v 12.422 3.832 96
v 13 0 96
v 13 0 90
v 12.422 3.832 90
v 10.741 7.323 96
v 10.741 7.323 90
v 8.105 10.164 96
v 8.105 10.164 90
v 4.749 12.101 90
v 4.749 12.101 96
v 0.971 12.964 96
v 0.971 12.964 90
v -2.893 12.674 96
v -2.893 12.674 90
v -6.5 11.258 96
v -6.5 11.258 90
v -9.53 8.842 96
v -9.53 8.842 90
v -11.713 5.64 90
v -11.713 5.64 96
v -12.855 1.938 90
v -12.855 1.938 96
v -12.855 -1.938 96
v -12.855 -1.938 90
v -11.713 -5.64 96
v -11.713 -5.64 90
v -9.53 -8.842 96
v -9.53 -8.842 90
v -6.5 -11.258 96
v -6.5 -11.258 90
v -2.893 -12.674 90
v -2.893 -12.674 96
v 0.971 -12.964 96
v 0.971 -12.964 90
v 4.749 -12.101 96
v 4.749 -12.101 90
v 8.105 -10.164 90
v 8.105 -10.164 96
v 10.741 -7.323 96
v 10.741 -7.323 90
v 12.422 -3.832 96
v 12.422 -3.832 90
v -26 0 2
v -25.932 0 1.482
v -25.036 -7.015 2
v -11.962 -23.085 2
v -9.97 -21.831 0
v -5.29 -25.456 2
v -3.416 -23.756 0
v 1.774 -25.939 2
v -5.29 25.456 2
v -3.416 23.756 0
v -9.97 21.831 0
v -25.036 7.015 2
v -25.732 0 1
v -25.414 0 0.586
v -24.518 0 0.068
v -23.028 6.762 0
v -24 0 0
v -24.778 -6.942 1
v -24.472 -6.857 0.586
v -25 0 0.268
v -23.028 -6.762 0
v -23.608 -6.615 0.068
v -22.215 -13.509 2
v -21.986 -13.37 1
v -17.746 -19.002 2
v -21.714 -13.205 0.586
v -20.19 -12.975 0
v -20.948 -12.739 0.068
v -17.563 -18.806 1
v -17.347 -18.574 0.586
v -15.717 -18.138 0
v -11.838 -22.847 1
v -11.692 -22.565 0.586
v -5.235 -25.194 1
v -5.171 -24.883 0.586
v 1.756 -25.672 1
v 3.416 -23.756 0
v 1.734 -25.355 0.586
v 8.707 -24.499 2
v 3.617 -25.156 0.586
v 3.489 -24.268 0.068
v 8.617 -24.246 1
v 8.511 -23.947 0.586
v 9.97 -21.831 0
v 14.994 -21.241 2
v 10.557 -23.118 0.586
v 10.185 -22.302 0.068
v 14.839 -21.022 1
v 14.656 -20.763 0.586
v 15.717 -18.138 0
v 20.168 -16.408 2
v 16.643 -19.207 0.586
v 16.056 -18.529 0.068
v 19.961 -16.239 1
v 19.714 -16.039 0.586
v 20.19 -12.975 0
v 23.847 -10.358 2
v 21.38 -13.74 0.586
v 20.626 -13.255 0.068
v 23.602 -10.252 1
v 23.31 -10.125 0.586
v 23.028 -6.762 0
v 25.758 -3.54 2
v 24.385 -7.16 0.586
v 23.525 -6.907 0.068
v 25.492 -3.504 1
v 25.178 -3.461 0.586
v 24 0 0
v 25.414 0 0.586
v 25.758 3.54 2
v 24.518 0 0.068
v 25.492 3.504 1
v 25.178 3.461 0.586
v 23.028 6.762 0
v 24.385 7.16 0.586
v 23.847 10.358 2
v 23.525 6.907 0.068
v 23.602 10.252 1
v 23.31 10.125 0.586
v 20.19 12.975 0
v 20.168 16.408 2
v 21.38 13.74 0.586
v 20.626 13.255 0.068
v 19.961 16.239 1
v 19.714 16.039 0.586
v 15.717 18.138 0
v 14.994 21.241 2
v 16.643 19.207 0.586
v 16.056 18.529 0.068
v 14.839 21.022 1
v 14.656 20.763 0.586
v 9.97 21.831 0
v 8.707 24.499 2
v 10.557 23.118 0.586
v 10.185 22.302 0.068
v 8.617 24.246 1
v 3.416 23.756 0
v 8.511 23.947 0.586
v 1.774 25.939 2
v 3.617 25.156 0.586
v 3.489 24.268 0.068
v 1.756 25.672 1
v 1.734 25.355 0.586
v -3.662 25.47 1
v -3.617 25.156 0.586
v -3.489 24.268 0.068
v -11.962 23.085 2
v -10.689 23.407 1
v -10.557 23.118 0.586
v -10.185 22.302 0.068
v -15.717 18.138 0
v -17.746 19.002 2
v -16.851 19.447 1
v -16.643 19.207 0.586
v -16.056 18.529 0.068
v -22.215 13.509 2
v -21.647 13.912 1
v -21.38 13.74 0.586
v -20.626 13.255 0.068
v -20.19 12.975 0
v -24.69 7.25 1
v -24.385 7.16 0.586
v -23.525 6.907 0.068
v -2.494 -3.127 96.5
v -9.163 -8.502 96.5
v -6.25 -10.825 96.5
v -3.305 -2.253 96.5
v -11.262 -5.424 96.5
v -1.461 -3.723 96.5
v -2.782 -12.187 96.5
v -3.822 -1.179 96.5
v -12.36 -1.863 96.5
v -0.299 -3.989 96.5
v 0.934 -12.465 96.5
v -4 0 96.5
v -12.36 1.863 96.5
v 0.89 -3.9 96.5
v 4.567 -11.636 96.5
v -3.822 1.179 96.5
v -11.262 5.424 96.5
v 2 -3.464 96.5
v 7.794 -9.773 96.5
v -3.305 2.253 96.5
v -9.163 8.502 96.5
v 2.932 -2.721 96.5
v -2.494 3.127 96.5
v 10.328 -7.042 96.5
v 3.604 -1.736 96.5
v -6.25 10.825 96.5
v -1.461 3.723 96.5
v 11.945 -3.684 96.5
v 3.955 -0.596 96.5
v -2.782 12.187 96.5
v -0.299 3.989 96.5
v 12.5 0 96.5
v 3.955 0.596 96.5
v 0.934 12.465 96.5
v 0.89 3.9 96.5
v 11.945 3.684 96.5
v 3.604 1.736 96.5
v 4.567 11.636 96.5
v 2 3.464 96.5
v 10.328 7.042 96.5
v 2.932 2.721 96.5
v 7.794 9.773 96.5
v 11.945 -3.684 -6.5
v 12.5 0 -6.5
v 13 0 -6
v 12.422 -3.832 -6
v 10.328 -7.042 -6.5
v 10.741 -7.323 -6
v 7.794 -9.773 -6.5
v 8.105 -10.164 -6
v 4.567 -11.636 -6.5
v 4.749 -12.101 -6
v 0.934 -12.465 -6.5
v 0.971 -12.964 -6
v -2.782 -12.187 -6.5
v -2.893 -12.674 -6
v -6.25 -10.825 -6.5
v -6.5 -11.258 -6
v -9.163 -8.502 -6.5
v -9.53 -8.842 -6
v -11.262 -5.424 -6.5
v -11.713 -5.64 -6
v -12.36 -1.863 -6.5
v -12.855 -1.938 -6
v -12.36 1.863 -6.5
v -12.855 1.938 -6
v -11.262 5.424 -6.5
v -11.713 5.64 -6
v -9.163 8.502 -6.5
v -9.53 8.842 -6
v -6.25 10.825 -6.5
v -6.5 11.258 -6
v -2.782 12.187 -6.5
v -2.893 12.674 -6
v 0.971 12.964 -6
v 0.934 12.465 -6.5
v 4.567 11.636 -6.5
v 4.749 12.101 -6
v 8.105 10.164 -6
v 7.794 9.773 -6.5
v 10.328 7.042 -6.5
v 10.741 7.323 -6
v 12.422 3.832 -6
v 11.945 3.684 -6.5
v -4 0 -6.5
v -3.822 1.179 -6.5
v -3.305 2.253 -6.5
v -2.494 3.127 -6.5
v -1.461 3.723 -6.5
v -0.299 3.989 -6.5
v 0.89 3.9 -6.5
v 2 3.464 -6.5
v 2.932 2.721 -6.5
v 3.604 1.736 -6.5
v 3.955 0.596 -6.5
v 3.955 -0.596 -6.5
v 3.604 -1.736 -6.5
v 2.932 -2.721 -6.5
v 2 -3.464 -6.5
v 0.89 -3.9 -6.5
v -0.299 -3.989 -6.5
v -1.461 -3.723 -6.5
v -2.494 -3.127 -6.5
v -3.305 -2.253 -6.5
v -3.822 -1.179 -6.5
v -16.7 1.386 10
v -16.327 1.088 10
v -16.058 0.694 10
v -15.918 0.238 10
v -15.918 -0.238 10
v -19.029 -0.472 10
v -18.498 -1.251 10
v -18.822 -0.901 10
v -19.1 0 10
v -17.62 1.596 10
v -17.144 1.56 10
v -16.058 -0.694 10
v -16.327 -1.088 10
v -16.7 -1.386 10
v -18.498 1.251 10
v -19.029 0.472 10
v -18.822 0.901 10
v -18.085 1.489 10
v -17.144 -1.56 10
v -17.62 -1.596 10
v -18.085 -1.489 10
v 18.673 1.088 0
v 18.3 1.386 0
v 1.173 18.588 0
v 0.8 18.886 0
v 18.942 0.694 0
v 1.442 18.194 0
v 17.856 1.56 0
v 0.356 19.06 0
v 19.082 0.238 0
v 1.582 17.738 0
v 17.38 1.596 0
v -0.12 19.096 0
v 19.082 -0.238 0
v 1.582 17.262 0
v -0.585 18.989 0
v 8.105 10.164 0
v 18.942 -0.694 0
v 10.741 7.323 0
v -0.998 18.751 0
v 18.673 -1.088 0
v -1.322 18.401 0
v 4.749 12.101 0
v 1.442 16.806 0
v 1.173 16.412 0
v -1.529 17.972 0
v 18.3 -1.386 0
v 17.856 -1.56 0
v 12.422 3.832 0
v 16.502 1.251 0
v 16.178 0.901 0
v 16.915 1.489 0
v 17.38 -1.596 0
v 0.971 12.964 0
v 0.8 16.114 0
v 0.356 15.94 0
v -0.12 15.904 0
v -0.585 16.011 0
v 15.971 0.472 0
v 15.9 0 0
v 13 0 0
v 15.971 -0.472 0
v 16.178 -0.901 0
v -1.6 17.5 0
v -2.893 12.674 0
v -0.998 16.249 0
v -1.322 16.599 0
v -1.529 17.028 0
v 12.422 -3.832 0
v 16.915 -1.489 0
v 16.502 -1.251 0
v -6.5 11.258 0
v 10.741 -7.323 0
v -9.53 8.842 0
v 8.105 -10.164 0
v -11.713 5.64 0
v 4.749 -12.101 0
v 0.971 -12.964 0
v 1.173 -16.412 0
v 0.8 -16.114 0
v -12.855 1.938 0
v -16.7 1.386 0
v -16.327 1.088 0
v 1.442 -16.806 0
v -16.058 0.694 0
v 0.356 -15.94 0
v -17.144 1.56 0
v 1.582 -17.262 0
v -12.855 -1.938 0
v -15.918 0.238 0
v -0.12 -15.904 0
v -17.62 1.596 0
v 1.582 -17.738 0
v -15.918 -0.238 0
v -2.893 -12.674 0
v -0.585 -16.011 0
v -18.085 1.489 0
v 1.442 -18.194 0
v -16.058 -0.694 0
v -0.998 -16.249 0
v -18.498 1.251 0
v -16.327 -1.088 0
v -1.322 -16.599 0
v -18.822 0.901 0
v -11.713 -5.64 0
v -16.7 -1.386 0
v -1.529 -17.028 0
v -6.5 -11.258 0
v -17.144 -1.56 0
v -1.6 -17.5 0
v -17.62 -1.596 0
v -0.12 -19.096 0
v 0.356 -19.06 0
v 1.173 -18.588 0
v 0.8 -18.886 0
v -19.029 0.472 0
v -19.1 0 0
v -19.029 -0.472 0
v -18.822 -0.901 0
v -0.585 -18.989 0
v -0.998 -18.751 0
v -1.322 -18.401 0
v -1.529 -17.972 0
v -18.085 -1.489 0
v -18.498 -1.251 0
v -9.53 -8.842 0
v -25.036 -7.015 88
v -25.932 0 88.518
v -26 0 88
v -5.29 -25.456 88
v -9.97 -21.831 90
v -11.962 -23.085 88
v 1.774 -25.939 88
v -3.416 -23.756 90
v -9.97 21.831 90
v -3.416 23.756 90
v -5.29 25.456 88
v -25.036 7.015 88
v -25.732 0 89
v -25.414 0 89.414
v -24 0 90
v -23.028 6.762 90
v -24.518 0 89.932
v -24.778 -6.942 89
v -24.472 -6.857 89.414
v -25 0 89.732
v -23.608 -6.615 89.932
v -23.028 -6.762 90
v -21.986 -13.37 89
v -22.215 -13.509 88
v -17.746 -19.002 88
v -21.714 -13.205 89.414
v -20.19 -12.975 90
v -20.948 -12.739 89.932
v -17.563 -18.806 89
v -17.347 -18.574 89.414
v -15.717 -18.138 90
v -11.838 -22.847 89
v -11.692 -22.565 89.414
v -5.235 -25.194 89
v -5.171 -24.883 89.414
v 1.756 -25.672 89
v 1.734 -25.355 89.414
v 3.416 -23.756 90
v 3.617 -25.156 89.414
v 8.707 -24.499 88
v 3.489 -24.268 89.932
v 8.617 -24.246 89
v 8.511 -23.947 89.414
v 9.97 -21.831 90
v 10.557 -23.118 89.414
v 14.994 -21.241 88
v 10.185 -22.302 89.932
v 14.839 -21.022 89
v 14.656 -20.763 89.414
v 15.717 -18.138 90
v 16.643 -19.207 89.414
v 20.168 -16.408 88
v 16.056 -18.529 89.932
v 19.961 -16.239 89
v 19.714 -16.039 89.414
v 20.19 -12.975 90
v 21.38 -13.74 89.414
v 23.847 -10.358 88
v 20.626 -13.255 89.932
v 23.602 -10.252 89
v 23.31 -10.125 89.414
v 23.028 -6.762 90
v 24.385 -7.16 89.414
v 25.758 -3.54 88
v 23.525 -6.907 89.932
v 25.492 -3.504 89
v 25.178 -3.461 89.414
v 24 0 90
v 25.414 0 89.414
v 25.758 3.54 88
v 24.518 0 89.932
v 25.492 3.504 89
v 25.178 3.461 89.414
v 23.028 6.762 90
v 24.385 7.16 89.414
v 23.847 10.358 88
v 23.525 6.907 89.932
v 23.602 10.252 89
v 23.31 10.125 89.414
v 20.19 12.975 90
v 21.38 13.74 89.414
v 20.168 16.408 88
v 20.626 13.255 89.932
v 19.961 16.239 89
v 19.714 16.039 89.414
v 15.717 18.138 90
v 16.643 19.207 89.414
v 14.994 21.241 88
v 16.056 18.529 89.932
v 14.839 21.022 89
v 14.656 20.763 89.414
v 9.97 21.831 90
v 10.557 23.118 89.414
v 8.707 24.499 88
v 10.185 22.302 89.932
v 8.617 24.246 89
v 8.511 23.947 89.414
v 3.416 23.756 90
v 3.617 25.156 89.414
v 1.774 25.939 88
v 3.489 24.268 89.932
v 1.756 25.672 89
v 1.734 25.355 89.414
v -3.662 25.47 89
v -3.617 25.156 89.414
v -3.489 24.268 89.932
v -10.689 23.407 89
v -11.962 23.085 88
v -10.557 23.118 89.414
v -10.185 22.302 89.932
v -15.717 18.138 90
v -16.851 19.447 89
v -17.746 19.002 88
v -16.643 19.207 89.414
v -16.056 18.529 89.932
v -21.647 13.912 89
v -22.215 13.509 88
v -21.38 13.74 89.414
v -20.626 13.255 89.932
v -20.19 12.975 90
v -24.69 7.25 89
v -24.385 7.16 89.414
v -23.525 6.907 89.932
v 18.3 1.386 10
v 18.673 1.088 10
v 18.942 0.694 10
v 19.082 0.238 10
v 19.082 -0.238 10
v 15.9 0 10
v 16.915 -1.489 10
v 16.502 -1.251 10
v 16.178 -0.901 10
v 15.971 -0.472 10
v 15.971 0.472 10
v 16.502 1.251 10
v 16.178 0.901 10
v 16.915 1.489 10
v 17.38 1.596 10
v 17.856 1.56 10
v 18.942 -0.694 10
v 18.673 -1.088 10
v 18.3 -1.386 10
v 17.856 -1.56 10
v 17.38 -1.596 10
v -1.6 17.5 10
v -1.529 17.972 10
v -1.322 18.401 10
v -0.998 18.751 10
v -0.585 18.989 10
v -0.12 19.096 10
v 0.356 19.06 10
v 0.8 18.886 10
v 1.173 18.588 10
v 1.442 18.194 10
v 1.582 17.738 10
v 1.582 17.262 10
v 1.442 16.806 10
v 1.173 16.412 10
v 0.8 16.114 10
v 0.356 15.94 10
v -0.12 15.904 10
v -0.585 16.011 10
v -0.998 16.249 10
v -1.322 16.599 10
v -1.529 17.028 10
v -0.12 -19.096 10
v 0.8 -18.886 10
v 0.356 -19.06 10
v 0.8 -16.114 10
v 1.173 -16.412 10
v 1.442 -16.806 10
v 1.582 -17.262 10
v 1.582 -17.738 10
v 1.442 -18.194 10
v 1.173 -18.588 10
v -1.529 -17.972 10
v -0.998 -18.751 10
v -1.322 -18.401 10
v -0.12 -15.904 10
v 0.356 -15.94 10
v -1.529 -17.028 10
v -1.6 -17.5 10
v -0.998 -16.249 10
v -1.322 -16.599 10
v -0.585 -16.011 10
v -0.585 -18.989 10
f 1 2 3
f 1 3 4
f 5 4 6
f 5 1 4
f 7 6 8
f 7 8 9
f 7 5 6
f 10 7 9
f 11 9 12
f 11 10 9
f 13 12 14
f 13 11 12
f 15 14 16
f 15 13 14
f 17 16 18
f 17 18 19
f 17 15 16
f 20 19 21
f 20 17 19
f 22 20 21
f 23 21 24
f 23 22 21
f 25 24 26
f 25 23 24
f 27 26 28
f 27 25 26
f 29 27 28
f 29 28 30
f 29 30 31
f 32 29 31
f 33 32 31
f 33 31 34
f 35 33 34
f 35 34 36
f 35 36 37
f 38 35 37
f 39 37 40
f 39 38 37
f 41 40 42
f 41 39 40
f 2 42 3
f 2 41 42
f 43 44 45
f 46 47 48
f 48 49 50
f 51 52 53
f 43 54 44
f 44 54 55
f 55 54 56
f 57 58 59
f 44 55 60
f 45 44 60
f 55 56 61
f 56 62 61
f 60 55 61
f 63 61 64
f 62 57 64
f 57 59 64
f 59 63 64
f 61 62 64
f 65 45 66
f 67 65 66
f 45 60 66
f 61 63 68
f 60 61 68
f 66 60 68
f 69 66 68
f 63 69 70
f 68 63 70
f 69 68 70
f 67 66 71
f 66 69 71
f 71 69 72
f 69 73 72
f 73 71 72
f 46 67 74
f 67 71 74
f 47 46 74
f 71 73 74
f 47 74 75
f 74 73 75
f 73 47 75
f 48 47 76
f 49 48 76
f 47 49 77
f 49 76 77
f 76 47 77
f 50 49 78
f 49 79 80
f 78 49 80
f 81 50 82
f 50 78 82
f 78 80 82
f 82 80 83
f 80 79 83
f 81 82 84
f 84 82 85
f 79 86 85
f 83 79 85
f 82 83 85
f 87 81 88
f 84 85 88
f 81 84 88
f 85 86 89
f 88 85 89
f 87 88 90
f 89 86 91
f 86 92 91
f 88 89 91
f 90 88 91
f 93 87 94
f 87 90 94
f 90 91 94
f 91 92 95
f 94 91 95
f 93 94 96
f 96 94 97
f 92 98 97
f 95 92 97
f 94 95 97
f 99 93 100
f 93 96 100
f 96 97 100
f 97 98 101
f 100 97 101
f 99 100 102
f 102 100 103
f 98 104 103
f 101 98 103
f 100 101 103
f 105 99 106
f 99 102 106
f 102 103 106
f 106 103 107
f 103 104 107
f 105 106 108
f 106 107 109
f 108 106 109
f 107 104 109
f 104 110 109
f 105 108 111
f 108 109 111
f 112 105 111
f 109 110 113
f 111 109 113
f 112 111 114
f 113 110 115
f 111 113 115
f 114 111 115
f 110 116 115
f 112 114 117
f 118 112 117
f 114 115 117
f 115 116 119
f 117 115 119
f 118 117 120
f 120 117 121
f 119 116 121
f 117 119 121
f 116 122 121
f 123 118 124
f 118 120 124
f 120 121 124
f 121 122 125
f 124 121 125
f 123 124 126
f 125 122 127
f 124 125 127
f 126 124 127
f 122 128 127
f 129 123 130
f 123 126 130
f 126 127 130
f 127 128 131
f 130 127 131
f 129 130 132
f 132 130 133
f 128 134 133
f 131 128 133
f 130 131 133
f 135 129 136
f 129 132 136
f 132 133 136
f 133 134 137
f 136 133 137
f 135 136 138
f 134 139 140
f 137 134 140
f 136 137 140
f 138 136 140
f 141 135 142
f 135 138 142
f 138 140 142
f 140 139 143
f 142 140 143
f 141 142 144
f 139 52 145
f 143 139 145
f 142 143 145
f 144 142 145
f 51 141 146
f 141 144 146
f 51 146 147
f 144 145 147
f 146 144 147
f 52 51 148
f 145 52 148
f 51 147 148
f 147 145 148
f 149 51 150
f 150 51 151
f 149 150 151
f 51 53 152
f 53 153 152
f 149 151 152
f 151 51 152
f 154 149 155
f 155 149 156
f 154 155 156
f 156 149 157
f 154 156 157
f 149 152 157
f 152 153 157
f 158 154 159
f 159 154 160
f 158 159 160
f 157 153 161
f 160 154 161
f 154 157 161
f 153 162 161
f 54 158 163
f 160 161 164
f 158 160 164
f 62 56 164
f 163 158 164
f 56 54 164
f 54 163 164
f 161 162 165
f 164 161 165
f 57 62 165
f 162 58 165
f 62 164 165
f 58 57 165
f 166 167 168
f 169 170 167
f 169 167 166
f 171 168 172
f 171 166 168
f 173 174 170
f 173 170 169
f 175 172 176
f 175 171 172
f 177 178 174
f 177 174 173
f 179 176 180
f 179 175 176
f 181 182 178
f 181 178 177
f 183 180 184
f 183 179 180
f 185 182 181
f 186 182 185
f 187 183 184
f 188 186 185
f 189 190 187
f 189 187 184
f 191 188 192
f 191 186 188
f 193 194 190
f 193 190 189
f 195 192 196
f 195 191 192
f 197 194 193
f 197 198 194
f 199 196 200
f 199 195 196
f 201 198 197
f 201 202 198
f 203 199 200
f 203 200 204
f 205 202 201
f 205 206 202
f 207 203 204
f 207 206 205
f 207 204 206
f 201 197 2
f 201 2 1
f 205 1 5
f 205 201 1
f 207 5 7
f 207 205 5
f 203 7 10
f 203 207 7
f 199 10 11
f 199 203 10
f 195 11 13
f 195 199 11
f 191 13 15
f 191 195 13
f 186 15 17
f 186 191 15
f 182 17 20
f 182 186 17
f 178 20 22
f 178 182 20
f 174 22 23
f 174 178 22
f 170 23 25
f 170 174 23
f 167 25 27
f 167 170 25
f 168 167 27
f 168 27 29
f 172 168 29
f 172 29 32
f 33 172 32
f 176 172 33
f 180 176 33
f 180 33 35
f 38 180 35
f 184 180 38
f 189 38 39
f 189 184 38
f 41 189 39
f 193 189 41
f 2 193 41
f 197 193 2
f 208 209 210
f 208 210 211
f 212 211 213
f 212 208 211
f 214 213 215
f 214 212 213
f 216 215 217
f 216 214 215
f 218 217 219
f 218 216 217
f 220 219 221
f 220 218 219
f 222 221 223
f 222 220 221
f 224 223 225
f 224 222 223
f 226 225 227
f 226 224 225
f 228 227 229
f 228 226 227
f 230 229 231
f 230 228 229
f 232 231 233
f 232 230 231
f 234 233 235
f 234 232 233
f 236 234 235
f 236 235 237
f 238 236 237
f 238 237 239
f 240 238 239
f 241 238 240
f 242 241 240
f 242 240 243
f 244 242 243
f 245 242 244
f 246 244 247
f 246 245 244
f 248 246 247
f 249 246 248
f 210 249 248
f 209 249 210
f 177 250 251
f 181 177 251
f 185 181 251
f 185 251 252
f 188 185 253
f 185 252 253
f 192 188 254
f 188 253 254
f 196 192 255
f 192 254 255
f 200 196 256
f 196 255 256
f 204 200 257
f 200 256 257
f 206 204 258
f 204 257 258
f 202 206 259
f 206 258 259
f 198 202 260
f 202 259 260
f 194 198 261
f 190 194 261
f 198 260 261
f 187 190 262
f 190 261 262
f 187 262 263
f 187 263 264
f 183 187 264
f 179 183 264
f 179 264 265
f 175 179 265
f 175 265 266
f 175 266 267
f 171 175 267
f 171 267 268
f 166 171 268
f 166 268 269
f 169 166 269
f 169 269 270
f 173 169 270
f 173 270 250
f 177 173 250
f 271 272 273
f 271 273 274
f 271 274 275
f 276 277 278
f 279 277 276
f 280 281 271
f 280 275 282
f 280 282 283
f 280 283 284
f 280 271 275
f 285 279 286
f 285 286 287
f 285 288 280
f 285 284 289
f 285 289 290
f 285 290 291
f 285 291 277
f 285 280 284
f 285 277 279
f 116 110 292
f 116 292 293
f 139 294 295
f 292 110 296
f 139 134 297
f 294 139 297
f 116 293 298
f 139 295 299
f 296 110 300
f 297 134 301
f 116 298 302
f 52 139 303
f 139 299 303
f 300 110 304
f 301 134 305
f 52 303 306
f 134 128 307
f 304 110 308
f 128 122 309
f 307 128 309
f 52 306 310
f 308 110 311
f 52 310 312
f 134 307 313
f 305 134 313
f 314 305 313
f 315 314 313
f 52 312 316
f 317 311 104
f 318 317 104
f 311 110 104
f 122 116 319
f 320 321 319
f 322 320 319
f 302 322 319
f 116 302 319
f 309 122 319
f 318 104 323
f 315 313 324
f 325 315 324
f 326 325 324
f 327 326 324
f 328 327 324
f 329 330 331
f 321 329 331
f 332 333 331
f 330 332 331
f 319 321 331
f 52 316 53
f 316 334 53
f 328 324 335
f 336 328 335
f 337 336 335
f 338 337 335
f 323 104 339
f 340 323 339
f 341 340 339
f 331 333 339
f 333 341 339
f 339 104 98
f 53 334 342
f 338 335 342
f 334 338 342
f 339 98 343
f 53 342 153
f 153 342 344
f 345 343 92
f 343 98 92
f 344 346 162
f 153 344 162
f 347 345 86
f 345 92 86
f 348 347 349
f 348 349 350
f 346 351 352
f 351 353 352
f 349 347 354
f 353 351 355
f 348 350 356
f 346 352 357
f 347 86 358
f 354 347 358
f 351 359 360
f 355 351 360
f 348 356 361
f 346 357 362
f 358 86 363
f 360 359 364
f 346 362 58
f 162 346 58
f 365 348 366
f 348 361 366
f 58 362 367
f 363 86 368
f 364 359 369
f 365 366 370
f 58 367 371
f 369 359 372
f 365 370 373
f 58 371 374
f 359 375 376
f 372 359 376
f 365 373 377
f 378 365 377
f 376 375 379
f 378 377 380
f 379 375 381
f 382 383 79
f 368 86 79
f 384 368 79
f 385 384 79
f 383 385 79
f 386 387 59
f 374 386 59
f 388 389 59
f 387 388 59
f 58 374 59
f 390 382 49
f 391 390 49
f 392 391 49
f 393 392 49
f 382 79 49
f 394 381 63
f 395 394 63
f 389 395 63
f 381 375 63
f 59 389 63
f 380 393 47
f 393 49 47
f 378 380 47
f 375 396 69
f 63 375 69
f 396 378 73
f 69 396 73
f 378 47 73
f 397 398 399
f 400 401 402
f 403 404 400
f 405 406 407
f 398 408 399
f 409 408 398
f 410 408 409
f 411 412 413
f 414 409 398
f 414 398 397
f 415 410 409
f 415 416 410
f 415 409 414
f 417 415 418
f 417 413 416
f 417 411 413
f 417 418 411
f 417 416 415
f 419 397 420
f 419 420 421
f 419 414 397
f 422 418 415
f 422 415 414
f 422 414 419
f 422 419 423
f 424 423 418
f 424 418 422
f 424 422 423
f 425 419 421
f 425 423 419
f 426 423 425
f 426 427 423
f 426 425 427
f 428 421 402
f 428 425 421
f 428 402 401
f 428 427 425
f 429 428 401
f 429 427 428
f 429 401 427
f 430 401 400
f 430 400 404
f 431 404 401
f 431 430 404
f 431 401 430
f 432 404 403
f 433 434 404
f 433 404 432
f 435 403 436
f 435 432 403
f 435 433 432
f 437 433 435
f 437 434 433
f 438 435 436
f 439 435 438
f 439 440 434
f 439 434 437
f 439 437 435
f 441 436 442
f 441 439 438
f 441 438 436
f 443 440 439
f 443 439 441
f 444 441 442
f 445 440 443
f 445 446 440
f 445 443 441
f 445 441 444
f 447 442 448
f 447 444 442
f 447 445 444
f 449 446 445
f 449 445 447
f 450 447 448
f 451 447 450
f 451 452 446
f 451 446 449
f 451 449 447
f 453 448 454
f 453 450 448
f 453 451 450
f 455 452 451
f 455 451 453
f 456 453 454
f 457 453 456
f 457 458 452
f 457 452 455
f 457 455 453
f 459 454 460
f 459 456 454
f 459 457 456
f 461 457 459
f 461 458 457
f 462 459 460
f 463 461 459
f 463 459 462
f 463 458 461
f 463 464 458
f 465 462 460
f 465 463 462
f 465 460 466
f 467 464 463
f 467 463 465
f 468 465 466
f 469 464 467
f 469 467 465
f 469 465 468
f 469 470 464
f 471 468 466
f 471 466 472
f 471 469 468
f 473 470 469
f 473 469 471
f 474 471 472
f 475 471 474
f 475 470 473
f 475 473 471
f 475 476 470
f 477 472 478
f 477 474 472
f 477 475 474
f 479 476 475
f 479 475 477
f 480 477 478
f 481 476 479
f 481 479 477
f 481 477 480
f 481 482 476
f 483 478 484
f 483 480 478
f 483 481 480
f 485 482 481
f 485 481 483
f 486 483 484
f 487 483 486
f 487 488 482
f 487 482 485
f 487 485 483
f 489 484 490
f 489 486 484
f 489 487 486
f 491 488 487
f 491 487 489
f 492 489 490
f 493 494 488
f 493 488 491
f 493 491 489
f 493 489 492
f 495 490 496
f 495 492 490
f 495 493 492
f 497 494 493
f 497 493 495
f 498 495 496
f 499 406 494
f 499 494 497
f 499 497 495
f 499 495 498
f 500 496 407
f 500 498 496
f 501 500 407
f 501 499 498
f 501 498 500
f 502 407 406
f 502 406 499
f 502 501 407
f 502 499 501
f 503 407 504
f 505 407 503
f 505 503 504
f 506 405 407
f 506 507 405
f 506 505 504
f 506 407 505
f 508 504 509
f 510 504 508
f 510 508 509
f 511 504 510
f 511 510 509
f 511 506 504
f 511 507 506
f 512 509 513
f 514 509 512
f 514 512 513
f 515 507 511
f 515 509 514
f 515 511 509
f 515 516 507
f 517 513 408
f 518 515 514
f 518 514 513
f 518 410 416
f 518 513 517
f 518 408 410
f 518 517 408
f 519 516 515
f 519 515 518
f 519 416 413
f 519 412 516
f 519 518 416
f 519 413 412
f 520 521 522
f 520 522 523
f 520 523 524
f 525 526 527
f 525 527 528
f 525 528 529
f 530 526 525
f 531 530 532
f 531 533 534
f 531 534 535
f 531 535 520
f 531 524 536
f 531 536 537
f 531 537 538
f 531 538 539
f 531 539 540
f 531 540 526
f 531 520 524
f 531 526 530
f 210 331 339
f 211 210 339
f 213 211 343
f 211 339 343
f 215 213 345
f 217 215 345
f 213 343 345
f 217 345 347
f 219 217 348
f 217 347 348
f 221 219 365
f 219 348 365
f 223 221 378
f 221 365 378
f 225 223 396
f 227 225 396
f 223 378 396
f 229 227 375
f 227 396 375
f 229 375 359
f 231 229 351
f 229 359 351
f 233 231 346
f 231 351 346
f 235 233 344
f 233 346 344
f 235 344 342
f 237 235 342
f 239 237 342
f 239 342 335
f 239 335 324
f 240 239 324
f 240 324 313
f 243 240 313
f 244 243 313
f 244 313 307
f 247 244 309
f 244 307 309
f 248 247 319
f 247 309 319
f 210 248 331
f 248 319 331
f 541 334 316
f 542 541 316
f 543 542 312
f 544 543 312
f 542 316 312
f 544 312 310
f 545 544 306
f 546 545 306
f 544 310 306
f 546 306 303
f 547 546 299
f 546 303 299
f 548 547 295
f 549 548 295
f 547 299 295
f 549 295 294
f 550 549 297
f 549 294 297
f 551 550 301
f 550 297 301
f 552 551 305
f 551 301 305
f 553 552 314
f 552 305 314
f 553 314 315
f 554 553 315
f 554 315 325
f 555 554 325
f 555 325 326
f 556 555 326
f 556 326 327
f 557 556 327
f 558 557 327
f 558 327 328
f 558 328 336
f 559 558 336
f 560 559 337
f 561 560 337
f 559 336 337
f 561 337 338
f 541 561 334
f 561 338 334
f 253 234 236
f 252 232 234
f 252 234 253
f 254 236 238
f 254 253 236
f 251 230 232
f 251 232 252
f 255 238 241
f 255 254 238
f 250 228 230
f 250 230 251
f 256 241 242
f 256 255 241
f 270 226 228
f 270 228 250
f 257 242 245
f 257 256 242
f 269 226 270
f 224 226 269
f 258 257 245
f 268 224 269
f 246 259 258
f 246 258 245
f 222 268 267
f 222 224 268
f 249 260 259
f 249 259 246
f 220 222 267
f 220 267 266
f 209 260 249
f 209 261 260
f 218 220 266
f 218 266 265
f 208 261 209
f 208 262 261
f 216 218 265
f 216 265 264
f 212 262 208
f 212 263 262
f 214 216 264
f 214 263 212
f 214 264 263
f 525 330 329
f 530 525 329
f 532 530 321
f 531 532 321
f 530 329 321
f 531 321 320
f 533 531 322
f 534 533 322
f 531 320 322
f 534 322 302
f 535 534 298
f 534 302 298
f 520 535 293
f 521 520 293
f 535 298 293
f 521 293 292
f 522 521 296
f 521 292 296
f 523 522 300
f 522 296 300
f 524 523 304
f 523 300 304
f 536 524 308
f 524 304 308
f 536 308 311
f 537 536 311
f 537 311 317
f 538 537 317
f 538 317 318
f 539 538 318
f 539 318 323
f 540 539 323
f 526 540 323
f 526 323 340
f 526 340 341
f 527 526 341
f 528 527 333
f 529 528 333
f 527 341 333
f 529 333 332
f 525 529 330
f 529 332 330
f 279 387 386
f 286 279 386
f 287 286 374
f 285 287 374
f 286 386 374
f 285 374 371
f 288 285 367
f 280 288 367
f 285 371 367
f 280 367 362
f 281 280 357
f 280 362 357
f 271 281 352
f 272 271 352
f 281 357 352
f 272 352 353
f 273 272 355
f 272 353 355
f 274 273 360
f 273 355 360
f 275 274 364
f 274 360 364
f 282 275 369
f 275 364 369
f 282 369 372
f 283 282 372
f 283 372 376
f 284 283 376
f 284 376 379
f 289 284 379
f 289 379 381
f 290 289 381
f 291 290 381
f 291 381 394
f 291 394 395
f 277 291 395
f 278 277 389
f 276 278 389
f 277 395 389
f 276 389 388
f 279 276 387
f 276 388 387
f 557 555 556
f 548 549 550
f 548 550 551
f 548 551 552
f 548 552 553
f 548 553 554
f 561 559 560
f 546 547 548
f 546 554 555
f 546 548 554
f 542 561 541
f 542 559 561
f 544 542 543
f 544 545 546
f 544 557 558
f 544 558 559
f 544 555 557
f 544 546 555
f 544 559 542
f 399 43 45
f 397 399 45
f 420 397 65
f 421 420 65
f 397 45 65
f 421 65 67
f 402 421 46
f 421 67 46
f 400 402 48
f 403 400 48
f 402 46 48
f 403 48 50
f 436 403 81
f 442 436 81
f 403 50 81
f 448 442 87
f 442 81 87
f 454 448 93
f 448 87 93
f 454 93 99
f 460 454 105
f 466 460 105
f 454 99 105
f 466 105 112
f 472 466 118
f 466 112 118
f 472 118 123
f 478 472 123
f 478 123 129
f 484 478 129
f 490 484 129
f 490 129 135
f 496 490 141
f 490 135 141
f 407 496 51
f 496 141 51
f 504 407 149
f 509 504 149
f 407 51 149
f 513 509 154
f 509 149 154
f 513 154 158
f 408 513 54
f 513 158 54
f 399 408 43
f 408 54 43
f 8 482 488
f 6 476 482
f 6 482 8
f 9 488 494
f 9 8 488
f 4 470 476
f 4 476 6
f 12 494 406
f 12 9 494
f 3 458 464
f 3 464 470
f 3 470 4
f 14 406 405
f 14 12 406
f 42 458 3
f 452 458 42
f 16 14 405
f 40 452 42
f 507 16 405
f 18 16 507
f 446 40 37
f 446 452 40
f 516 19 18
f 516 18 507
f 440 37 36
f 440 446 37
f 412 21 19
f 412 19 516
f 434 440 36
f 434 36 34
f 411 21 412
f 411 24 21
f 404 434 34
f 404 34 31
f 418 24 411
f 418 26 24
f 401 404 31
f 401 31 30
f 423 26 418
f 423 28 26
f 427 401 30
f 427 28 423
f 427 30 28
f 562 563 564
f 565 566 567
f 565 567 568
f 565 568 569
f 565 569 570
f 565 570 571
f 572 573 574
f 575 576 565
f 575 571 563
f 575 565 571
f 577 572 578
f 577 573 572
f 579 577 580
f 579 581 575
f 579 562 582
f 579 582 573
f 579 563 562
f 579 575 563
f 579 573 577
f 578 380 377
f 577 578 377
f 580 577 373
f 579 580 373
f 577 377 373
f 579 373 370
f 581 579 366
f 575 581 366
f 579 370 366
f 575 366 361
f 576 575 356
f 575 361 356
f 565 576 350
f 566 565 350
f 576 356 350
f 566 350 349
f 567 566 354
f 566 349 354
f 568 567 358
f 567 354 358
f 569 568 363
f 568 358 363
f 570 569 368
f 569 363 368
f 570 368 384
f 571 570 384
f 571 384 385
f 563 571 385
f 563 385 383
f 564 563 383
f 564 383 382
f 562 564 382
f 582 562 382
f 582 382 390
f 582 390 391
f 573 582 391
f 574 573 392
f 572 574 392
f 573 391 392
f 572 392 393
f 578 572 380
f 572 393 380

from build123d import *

# Parameters (mm, degrees)
SKICA1_R                 = 26
P_IDAT_VYSUNUT_M1_DEPTH  = 90
ZAOBLIT1_R               = 2
SKICA2_R                 = 13
P_IDAT_VYSUNUT_M2_DEPTH  = 6.5
SKICA4_R                 = 1.6
ODEBRAT_VYSUNUT_M1_DEPTH = 10
P_IDAT_START             = 6.5
SKICA5_R                 = 13
P_IDAT_VYSUNUT_M4_DEPTH  = 6.5
ZKOSEN_1_SIZE            = 0.5
SKICA8_R                 = 4
ODEBRAT_VYSUNUT_M3_DEPTH = 110.366356825


with BuildPart() as part:
    # Skica1 → Přidat vysunutím1 (new body)
    with BuildSketch(Plane.XY):
        with Locations(Location((0, 0, 0), (0, 0, 180))):
            Circle(SKICA1_R)
    extrude(amount=P_IDAT_VYSUNUT_M1_DEPTH)

    # Zaoblit1
    zaoblit1_edges = [part.edges().sort_by_distance(p)[0] for p in [
        (26, 0, 0),
        (26, 0, 90),
    ]]
    fillet(zaoblit1_edges, radius=ZAOBLIT1_R)

    # Skica2 → Přidat vysunutím2 (add)
    with BuildSketch(Plane(origin=(0, 0, 0), x_dir=(-1, 0, 0), z_dir=(0, 0, -1))):
        with Locations(Location((0, 0, 0), (0, 0, 180))):
            Circle(SKICA2_R)
    extrude(amount=P_IDAT_VYSUNUT_M2_DEPTH)

    # Skica4 → Odebrat vysunutím1 (cut)
    with BuildSketch(Plane(origin=(0, 0, 0), x_dir=(-1, 0, 0), z_dir=(0, 0, -1))):
        with Locations((-17.5, 0)):
            Circle(SKICA4_R)
        with Locations((0, 17.5)):
            Circle(SKICA4_R)
        with Locations((17.5, 0)):
            Circle(SKICA4_R)
        with Locations((0, -17.5)):
            Circle(SKICA4_R)
    extrude(amount=-ODEBRAT_VYSUNUT_M1_DEPTH, mode=Mode.SUBTRACT)

    # Skica5 → Přidat vysunutím4 (add)
    with BuildSketch(Plane.XY.offset(90).offset(P_IDAT_START)):
        Circle(SKICA5_R)
    extrude(amount=-P_IDAT_VYSUNUT_M4_DEPTH)

    # Zkosení1
    zkosen_1_edges = [part.edges().sort_by_distance(p)[0] for p in [
        (-13, 0, -6.5),
        (-13, 0, 96.5),
    ]]
    chamfer(zkosen_1_edges, length=ZKOSEN_1_SIZE)

    # Skica8 → Odebrat vysunutím3 (cut, through all)
    with BuildSketch(Plane(origin=(0, 0, -6.5), x_dir=(-1, 0, 0), z_dir=(0, 0, -1))):
        Circle(SKICA8_R)
    extrude(amount=-ODEBRAT_VYSUNUT_M3_DEPTH, mode=Mode.SUBTRACT)


solid = part.part
